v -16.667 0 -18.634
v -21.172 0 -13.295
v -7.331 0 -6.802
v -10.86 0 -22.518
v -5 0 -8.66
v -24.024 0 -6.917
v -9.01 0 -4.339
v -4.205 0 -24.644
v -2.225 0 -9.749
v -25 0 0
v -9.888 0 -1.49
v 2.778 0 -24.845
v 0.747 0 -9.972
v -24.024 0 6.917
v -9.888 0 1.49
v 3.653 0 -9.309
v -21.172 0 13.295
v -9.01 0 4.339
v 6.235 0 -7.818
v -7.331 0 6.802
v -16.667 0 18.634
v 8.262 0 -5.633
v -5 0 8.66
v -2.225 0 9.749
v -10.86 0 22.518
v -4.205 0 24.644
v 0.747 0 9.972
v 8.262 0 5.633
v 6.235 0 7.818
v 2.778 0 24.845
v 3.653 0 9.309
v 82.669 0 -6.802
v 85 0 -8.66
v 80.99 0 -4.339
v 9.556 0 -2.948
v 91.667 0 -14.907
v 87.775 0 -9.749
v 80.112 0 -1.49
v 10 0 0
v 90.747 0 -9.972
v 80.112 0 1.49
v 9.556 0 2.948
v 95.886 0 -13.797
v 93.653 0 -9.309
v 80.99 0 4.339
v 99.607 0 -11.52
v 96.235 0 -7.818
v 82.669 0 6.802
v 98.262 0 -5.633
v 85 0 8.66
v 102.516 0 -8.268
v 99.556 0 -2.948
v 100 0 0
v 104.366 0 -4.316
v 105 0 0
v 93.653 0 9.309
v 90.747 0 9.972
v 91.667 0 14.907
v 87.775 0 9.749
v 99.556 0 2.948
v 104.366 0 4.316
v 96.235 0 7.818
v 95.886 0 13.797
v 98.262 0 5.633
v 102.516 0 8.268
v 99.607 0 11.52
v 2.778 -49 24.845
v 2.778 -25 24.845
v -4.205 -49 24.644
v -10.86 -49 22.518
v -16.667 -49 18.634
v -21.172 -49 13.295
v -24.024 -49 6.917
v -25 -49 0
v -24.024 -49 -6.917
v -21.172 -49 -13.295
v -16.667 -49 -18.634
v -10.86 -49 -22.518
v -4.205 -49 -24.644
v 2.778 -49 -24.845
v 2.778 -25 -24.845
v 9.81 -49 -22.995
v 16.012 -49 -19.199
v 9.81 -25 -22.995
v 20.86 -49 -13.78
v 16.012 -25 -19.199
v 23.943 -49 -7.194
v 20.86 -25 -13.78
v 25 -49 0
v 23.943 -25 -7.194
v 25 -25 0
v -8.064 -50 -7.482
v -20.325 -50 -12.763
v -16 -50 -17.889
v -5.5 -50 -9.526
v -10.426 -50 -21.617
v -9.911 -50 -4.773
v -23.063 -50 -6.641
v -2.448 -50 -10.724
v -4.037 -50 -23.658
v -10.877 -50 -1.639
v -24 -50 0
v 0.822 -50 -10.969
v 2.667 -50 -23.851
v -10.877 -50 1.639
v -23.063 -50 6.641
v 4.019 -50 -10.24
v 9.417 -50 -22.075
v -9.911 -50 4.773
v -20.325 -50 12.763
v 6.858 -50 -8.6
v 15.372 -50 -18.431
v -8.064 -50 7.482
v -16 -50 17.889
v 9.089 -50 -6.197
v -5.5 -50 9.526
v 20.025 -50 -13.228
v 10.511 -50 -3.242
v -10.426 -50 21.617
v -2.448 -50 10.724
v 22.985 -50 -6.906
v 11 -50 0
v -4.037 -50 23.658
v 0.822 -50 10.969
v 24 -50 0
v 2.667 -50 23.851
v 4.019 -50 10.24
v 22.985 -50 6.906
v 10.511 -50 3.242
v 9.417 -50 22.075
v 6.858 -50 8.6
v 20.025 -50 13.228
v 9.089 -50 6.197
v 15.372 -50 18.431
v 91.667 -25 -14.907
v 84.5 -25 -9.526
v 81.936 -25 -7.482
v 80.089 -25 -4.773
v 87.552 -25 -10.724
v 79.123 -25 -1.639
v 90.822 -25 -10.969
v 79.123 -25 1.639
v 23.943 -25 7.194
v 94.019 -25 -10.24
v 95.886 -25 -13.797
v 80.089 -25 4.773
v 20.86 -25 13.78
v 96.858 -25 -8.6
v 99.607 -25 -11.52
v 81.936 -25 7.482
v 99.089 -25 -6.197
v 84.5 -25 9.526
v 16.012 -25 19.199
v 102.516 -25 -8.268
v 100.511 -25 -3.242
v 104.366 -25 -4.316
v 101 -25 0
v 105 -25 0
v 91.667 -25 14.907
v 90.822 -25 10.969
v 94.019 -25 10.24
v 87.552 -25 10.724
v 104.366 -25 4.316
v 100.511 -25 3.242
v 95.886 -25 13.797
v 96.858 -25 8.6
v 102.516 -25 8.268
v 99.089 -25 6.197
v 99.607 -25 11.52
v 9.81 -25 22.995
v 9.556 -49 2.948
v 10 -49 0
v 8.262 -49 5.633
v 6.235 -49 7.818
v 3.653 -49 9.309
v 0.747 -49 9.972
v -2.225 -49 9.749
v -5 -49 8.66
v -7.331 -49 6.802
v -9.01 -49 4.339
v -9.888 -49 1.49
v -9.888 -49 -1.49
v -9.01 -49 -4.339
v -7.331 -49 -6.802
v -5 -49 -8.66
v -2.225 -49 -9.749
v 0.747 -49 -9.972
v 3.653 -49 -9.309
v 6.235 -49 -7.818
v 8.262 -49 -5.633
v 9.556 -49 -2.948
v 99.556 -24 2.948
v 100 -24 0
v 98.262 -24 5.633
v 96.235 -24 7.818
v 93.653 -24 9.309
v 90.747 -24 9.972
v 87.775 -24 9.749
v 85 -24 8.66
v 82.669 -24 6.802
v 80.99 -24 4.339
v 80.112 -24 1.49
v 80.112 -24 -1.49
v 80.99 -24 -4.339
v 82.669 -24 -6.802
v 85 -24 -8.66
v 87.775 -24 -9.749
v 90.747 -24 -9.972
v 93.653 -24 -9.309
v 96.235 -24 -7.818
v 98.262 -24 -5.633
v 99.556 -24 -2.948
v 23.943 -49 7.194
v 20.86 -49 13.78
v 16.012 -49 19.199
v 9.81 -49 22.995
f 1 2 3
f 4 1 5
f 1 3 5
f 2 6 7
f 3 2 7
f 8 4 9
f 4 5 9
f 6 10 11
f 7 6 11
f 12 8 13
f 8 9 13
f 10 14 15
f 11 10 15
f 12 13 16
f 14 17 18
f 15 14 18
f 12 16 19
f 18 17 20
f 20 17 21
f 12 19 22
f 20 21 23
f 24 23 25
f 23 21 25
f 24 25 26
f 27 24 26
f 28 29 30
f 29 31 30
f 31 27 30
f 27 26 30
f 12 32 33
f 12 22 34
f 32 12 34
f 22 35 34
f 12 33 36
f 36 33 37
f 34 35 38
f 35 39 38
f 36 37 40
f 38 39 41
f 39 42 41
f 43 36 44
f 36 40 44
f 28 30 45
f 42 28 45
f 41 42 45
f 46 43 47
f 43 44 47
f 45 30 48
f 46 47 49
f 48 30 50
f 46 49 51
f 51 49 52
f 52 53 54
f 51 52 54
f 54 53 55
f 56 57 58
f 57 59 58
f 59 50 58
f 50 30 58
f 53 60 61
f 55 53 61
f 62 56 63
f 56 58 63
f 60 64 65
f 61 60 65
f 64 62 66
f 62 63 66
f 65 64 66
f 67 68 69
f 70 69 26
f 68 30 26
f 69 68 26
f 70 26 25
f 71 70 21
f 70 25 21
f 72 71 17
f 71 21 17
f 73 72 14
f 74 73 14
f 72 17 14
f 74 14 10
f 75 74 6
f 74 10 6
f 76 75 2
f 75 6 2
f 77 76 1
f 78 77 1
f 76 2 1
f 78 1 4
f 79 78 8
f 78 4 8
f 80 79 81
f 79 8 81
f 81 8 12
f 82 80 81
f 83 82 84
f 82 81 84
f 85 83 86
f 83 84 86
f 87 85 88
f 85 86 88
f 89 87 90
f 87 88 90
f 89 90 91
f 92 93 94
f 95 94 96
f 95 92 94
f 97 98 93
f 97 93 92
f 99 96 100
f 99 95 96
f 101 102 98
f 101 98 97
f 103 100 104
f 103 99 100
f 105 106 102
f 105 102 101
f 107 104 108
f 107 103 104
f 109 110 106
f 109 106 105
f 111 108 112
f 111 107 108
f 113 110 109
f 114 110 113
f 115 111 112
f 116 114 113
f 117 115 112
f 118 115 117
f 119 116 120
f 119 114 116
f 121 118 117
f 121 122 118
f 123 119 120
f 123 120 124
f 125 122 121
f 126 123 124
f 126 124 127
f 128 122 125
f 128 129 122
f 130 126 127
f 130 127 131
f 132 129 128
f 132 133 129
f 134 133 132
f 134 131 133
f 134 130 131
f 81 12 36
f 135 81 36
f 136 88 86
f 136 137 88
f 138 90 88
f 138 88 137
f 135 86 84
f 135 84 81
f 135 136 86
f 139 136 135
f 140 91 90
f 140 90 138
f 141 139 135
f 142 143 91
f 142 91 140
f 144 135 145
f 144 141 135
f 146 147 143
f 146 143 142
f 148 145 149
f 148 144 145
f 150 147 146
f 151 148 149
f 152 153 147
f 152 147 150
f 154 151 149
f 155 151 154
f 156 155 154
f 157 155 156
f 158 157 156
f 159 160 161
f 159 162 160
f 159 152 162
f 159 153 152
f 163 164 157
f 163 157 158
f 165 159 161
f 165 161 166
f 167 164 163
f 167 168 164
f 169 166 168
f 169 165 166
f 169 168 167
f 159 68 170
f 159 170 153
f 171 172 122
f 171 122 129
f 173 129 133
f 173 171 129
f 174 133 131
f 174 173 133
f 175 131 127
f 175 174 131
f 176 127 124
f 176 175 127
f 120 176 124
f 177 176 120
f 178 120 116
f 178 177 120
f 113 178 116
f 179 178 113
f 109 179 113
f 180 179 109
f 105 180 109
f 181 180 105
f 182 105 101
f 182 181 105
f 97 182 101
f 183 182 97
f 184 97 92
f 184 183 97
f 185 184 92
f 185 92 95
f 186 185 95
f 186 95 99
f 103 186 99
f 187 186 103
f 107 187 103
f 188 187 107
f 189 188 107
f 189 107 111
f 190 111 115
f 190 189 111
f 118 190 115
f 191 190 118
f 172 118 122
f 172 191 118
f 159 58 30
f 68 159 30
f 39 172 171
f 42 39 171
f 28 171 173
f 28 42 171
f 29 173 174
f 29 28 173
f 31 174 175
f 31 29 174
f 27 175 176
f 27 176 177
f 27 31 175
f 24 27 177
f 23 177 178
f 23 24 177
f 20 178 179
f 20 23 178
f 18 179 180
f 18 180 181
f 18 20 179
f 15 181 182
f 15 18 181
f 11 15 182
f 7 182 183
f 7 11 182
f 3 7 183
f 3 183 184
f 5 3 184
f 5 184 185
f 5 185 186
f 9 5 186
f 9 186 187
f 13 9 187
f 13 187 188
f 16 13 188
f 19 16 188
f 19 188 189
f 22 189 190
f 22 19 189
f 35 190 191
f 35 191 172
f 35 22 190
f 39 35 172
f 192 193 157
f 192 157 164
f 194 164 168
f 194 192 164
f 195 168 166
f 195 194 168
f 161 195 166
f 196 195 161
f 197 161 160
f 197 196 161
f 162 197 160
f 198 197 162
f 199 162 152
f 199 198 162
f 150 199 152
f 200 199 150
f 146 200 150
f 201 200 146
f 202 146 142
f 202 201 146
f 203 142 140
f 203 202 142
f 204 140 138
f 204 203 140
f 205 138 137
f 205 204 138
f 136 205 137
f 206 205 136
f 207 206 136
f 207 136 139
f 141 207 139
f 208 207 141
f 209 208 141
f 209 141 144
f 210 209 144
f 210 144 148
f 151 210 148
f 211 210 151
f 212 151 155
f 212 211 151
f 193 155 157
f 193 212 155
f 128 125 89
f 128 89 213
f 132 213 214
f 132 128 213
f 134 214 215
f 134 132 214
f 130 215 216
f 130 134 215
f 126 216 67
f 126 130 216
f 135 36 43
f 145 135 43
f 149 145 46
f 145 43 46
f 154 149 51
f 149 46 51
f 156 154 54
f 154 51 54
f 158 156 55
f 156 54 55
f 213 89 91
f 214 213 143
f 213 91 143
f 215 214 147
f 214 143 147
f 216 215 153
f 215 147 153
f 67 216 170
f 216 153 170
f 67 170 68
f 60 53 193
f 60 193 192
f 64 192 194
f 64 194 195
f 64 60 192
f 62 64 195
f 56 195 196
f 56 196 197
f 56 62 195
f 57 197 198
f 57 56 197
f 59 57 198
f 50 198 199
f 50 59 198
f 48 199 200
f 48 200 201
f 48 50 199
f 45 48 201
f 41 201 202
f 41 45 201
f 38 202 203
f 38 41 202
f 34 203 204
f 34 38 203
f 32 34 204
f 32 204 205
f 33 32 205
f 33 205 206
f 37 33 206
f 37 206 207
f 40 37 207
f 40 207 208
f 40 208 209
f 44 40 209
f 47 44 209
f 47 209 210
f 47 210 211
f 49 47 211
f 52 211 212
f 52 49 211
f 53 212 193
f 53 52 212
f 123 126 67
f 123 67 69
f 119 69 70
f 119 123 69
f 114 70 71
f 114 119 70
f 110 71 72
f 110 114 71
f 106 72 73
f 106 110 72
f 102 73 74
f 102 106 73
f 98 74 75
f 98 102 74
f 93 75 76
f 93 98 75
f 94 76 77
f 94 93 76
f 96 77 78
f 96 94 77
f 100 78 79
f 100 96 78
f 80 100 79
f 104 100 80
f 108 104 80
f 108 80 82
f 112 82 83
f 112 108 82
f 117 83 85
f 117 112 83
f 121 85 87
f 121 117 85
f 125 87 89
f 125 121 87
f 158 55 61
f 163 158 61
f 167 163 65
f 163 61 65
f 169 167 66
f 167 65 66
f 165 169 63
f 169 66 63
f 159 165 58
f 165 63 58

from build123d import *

# Parameters (mm, degrees)
F0_R     = 10
F1_DEPTH = 25
F2_DEPTH = 50
F3_SIZE  = 1
F4_SIZE  = 1


with BuildPart() as f1:
    # F0 (on Front) → F1 (new body)
    with BuildSketch(Plane.XZ):
        with BuildLine():
            ThreePointArc((2.777778, -24.8452), (18.6339, -16.666667), (25, 0))
            ThreePointArc((25, 0), (18.6339, 16.666667), (2.777778, 24.8452))
            ThreePointArc((2.777778, 24.8452), (-25, 0), (2.777778, -24.8452))
        make_face()
        Circle(F0_R, mode=Mode.SUBTRACT)
        with BuildLine():
            ThreePointArc((2.777778, 24.8452), (18.6339, 16.666667), (25, 0))
            ThreePointArc((25, 0), (18.6339, -16.666667), (2.777778, -24.8452))
            Line((2.777778, -24.8452), (91.666667, -14.90712))
            ThreePointArc((91.666667, -14.90712), (75, 0), (91.666667, 14.90712))
            Line((91.666667, 14.90712), (2.777778, 24.8452))
        make_face()
        with BuildLine():
            ThreePointArc((105, 0), (101.18034, 10), (91.666667, 14.90712))
            ThreePointArc((91.666667, 14.90712), (75, 0), (91.666667, -14.90712))
            ThreePointArc((91.666667, -14.90712), (101.18034, -10), (105, 0))
        make_face()
        with Locations((90, 0)):
            Circle(F0_R, mode=Mode.SUBTRACT)
    extrude(amount=F1_DEPTH)

    # F0 (on Front) → F2 (join)
    with BuildSketch(Plane.XZ):
        with BuildLine():
            ThreePointArc((2.777778, -24.8452), (18.6339, -16.666667), (25, 0))
            ThreePointArc((25, 0), (18.6339, 16.666667), (2.777778, 24.8452))
            ThreePointArc((2.777778, 24.8452), (-25, 0), (2.777778, -24.8452))
        make_face()
        Circle(F0_R, mode=Mode.SUBTRACT)
    extrude(amount=F2_DEPTH)

    # F3
    f3_edges = [f1.edges().sort_by_distance(p)[0] for p in [
        (-2.777778, -50, 24.8452),
    ]]
    chamfer(f3_edges, length=F3_SIZE)

    # F4
    f4_edges = [f1.edges().sort_by_distance(p)[0] for p in [
        (80, -25, 0),
        (-10, -50, 0),
    ]]
    chamfer(f4_edges, length=F4_SIZE)


solid = f1.part
